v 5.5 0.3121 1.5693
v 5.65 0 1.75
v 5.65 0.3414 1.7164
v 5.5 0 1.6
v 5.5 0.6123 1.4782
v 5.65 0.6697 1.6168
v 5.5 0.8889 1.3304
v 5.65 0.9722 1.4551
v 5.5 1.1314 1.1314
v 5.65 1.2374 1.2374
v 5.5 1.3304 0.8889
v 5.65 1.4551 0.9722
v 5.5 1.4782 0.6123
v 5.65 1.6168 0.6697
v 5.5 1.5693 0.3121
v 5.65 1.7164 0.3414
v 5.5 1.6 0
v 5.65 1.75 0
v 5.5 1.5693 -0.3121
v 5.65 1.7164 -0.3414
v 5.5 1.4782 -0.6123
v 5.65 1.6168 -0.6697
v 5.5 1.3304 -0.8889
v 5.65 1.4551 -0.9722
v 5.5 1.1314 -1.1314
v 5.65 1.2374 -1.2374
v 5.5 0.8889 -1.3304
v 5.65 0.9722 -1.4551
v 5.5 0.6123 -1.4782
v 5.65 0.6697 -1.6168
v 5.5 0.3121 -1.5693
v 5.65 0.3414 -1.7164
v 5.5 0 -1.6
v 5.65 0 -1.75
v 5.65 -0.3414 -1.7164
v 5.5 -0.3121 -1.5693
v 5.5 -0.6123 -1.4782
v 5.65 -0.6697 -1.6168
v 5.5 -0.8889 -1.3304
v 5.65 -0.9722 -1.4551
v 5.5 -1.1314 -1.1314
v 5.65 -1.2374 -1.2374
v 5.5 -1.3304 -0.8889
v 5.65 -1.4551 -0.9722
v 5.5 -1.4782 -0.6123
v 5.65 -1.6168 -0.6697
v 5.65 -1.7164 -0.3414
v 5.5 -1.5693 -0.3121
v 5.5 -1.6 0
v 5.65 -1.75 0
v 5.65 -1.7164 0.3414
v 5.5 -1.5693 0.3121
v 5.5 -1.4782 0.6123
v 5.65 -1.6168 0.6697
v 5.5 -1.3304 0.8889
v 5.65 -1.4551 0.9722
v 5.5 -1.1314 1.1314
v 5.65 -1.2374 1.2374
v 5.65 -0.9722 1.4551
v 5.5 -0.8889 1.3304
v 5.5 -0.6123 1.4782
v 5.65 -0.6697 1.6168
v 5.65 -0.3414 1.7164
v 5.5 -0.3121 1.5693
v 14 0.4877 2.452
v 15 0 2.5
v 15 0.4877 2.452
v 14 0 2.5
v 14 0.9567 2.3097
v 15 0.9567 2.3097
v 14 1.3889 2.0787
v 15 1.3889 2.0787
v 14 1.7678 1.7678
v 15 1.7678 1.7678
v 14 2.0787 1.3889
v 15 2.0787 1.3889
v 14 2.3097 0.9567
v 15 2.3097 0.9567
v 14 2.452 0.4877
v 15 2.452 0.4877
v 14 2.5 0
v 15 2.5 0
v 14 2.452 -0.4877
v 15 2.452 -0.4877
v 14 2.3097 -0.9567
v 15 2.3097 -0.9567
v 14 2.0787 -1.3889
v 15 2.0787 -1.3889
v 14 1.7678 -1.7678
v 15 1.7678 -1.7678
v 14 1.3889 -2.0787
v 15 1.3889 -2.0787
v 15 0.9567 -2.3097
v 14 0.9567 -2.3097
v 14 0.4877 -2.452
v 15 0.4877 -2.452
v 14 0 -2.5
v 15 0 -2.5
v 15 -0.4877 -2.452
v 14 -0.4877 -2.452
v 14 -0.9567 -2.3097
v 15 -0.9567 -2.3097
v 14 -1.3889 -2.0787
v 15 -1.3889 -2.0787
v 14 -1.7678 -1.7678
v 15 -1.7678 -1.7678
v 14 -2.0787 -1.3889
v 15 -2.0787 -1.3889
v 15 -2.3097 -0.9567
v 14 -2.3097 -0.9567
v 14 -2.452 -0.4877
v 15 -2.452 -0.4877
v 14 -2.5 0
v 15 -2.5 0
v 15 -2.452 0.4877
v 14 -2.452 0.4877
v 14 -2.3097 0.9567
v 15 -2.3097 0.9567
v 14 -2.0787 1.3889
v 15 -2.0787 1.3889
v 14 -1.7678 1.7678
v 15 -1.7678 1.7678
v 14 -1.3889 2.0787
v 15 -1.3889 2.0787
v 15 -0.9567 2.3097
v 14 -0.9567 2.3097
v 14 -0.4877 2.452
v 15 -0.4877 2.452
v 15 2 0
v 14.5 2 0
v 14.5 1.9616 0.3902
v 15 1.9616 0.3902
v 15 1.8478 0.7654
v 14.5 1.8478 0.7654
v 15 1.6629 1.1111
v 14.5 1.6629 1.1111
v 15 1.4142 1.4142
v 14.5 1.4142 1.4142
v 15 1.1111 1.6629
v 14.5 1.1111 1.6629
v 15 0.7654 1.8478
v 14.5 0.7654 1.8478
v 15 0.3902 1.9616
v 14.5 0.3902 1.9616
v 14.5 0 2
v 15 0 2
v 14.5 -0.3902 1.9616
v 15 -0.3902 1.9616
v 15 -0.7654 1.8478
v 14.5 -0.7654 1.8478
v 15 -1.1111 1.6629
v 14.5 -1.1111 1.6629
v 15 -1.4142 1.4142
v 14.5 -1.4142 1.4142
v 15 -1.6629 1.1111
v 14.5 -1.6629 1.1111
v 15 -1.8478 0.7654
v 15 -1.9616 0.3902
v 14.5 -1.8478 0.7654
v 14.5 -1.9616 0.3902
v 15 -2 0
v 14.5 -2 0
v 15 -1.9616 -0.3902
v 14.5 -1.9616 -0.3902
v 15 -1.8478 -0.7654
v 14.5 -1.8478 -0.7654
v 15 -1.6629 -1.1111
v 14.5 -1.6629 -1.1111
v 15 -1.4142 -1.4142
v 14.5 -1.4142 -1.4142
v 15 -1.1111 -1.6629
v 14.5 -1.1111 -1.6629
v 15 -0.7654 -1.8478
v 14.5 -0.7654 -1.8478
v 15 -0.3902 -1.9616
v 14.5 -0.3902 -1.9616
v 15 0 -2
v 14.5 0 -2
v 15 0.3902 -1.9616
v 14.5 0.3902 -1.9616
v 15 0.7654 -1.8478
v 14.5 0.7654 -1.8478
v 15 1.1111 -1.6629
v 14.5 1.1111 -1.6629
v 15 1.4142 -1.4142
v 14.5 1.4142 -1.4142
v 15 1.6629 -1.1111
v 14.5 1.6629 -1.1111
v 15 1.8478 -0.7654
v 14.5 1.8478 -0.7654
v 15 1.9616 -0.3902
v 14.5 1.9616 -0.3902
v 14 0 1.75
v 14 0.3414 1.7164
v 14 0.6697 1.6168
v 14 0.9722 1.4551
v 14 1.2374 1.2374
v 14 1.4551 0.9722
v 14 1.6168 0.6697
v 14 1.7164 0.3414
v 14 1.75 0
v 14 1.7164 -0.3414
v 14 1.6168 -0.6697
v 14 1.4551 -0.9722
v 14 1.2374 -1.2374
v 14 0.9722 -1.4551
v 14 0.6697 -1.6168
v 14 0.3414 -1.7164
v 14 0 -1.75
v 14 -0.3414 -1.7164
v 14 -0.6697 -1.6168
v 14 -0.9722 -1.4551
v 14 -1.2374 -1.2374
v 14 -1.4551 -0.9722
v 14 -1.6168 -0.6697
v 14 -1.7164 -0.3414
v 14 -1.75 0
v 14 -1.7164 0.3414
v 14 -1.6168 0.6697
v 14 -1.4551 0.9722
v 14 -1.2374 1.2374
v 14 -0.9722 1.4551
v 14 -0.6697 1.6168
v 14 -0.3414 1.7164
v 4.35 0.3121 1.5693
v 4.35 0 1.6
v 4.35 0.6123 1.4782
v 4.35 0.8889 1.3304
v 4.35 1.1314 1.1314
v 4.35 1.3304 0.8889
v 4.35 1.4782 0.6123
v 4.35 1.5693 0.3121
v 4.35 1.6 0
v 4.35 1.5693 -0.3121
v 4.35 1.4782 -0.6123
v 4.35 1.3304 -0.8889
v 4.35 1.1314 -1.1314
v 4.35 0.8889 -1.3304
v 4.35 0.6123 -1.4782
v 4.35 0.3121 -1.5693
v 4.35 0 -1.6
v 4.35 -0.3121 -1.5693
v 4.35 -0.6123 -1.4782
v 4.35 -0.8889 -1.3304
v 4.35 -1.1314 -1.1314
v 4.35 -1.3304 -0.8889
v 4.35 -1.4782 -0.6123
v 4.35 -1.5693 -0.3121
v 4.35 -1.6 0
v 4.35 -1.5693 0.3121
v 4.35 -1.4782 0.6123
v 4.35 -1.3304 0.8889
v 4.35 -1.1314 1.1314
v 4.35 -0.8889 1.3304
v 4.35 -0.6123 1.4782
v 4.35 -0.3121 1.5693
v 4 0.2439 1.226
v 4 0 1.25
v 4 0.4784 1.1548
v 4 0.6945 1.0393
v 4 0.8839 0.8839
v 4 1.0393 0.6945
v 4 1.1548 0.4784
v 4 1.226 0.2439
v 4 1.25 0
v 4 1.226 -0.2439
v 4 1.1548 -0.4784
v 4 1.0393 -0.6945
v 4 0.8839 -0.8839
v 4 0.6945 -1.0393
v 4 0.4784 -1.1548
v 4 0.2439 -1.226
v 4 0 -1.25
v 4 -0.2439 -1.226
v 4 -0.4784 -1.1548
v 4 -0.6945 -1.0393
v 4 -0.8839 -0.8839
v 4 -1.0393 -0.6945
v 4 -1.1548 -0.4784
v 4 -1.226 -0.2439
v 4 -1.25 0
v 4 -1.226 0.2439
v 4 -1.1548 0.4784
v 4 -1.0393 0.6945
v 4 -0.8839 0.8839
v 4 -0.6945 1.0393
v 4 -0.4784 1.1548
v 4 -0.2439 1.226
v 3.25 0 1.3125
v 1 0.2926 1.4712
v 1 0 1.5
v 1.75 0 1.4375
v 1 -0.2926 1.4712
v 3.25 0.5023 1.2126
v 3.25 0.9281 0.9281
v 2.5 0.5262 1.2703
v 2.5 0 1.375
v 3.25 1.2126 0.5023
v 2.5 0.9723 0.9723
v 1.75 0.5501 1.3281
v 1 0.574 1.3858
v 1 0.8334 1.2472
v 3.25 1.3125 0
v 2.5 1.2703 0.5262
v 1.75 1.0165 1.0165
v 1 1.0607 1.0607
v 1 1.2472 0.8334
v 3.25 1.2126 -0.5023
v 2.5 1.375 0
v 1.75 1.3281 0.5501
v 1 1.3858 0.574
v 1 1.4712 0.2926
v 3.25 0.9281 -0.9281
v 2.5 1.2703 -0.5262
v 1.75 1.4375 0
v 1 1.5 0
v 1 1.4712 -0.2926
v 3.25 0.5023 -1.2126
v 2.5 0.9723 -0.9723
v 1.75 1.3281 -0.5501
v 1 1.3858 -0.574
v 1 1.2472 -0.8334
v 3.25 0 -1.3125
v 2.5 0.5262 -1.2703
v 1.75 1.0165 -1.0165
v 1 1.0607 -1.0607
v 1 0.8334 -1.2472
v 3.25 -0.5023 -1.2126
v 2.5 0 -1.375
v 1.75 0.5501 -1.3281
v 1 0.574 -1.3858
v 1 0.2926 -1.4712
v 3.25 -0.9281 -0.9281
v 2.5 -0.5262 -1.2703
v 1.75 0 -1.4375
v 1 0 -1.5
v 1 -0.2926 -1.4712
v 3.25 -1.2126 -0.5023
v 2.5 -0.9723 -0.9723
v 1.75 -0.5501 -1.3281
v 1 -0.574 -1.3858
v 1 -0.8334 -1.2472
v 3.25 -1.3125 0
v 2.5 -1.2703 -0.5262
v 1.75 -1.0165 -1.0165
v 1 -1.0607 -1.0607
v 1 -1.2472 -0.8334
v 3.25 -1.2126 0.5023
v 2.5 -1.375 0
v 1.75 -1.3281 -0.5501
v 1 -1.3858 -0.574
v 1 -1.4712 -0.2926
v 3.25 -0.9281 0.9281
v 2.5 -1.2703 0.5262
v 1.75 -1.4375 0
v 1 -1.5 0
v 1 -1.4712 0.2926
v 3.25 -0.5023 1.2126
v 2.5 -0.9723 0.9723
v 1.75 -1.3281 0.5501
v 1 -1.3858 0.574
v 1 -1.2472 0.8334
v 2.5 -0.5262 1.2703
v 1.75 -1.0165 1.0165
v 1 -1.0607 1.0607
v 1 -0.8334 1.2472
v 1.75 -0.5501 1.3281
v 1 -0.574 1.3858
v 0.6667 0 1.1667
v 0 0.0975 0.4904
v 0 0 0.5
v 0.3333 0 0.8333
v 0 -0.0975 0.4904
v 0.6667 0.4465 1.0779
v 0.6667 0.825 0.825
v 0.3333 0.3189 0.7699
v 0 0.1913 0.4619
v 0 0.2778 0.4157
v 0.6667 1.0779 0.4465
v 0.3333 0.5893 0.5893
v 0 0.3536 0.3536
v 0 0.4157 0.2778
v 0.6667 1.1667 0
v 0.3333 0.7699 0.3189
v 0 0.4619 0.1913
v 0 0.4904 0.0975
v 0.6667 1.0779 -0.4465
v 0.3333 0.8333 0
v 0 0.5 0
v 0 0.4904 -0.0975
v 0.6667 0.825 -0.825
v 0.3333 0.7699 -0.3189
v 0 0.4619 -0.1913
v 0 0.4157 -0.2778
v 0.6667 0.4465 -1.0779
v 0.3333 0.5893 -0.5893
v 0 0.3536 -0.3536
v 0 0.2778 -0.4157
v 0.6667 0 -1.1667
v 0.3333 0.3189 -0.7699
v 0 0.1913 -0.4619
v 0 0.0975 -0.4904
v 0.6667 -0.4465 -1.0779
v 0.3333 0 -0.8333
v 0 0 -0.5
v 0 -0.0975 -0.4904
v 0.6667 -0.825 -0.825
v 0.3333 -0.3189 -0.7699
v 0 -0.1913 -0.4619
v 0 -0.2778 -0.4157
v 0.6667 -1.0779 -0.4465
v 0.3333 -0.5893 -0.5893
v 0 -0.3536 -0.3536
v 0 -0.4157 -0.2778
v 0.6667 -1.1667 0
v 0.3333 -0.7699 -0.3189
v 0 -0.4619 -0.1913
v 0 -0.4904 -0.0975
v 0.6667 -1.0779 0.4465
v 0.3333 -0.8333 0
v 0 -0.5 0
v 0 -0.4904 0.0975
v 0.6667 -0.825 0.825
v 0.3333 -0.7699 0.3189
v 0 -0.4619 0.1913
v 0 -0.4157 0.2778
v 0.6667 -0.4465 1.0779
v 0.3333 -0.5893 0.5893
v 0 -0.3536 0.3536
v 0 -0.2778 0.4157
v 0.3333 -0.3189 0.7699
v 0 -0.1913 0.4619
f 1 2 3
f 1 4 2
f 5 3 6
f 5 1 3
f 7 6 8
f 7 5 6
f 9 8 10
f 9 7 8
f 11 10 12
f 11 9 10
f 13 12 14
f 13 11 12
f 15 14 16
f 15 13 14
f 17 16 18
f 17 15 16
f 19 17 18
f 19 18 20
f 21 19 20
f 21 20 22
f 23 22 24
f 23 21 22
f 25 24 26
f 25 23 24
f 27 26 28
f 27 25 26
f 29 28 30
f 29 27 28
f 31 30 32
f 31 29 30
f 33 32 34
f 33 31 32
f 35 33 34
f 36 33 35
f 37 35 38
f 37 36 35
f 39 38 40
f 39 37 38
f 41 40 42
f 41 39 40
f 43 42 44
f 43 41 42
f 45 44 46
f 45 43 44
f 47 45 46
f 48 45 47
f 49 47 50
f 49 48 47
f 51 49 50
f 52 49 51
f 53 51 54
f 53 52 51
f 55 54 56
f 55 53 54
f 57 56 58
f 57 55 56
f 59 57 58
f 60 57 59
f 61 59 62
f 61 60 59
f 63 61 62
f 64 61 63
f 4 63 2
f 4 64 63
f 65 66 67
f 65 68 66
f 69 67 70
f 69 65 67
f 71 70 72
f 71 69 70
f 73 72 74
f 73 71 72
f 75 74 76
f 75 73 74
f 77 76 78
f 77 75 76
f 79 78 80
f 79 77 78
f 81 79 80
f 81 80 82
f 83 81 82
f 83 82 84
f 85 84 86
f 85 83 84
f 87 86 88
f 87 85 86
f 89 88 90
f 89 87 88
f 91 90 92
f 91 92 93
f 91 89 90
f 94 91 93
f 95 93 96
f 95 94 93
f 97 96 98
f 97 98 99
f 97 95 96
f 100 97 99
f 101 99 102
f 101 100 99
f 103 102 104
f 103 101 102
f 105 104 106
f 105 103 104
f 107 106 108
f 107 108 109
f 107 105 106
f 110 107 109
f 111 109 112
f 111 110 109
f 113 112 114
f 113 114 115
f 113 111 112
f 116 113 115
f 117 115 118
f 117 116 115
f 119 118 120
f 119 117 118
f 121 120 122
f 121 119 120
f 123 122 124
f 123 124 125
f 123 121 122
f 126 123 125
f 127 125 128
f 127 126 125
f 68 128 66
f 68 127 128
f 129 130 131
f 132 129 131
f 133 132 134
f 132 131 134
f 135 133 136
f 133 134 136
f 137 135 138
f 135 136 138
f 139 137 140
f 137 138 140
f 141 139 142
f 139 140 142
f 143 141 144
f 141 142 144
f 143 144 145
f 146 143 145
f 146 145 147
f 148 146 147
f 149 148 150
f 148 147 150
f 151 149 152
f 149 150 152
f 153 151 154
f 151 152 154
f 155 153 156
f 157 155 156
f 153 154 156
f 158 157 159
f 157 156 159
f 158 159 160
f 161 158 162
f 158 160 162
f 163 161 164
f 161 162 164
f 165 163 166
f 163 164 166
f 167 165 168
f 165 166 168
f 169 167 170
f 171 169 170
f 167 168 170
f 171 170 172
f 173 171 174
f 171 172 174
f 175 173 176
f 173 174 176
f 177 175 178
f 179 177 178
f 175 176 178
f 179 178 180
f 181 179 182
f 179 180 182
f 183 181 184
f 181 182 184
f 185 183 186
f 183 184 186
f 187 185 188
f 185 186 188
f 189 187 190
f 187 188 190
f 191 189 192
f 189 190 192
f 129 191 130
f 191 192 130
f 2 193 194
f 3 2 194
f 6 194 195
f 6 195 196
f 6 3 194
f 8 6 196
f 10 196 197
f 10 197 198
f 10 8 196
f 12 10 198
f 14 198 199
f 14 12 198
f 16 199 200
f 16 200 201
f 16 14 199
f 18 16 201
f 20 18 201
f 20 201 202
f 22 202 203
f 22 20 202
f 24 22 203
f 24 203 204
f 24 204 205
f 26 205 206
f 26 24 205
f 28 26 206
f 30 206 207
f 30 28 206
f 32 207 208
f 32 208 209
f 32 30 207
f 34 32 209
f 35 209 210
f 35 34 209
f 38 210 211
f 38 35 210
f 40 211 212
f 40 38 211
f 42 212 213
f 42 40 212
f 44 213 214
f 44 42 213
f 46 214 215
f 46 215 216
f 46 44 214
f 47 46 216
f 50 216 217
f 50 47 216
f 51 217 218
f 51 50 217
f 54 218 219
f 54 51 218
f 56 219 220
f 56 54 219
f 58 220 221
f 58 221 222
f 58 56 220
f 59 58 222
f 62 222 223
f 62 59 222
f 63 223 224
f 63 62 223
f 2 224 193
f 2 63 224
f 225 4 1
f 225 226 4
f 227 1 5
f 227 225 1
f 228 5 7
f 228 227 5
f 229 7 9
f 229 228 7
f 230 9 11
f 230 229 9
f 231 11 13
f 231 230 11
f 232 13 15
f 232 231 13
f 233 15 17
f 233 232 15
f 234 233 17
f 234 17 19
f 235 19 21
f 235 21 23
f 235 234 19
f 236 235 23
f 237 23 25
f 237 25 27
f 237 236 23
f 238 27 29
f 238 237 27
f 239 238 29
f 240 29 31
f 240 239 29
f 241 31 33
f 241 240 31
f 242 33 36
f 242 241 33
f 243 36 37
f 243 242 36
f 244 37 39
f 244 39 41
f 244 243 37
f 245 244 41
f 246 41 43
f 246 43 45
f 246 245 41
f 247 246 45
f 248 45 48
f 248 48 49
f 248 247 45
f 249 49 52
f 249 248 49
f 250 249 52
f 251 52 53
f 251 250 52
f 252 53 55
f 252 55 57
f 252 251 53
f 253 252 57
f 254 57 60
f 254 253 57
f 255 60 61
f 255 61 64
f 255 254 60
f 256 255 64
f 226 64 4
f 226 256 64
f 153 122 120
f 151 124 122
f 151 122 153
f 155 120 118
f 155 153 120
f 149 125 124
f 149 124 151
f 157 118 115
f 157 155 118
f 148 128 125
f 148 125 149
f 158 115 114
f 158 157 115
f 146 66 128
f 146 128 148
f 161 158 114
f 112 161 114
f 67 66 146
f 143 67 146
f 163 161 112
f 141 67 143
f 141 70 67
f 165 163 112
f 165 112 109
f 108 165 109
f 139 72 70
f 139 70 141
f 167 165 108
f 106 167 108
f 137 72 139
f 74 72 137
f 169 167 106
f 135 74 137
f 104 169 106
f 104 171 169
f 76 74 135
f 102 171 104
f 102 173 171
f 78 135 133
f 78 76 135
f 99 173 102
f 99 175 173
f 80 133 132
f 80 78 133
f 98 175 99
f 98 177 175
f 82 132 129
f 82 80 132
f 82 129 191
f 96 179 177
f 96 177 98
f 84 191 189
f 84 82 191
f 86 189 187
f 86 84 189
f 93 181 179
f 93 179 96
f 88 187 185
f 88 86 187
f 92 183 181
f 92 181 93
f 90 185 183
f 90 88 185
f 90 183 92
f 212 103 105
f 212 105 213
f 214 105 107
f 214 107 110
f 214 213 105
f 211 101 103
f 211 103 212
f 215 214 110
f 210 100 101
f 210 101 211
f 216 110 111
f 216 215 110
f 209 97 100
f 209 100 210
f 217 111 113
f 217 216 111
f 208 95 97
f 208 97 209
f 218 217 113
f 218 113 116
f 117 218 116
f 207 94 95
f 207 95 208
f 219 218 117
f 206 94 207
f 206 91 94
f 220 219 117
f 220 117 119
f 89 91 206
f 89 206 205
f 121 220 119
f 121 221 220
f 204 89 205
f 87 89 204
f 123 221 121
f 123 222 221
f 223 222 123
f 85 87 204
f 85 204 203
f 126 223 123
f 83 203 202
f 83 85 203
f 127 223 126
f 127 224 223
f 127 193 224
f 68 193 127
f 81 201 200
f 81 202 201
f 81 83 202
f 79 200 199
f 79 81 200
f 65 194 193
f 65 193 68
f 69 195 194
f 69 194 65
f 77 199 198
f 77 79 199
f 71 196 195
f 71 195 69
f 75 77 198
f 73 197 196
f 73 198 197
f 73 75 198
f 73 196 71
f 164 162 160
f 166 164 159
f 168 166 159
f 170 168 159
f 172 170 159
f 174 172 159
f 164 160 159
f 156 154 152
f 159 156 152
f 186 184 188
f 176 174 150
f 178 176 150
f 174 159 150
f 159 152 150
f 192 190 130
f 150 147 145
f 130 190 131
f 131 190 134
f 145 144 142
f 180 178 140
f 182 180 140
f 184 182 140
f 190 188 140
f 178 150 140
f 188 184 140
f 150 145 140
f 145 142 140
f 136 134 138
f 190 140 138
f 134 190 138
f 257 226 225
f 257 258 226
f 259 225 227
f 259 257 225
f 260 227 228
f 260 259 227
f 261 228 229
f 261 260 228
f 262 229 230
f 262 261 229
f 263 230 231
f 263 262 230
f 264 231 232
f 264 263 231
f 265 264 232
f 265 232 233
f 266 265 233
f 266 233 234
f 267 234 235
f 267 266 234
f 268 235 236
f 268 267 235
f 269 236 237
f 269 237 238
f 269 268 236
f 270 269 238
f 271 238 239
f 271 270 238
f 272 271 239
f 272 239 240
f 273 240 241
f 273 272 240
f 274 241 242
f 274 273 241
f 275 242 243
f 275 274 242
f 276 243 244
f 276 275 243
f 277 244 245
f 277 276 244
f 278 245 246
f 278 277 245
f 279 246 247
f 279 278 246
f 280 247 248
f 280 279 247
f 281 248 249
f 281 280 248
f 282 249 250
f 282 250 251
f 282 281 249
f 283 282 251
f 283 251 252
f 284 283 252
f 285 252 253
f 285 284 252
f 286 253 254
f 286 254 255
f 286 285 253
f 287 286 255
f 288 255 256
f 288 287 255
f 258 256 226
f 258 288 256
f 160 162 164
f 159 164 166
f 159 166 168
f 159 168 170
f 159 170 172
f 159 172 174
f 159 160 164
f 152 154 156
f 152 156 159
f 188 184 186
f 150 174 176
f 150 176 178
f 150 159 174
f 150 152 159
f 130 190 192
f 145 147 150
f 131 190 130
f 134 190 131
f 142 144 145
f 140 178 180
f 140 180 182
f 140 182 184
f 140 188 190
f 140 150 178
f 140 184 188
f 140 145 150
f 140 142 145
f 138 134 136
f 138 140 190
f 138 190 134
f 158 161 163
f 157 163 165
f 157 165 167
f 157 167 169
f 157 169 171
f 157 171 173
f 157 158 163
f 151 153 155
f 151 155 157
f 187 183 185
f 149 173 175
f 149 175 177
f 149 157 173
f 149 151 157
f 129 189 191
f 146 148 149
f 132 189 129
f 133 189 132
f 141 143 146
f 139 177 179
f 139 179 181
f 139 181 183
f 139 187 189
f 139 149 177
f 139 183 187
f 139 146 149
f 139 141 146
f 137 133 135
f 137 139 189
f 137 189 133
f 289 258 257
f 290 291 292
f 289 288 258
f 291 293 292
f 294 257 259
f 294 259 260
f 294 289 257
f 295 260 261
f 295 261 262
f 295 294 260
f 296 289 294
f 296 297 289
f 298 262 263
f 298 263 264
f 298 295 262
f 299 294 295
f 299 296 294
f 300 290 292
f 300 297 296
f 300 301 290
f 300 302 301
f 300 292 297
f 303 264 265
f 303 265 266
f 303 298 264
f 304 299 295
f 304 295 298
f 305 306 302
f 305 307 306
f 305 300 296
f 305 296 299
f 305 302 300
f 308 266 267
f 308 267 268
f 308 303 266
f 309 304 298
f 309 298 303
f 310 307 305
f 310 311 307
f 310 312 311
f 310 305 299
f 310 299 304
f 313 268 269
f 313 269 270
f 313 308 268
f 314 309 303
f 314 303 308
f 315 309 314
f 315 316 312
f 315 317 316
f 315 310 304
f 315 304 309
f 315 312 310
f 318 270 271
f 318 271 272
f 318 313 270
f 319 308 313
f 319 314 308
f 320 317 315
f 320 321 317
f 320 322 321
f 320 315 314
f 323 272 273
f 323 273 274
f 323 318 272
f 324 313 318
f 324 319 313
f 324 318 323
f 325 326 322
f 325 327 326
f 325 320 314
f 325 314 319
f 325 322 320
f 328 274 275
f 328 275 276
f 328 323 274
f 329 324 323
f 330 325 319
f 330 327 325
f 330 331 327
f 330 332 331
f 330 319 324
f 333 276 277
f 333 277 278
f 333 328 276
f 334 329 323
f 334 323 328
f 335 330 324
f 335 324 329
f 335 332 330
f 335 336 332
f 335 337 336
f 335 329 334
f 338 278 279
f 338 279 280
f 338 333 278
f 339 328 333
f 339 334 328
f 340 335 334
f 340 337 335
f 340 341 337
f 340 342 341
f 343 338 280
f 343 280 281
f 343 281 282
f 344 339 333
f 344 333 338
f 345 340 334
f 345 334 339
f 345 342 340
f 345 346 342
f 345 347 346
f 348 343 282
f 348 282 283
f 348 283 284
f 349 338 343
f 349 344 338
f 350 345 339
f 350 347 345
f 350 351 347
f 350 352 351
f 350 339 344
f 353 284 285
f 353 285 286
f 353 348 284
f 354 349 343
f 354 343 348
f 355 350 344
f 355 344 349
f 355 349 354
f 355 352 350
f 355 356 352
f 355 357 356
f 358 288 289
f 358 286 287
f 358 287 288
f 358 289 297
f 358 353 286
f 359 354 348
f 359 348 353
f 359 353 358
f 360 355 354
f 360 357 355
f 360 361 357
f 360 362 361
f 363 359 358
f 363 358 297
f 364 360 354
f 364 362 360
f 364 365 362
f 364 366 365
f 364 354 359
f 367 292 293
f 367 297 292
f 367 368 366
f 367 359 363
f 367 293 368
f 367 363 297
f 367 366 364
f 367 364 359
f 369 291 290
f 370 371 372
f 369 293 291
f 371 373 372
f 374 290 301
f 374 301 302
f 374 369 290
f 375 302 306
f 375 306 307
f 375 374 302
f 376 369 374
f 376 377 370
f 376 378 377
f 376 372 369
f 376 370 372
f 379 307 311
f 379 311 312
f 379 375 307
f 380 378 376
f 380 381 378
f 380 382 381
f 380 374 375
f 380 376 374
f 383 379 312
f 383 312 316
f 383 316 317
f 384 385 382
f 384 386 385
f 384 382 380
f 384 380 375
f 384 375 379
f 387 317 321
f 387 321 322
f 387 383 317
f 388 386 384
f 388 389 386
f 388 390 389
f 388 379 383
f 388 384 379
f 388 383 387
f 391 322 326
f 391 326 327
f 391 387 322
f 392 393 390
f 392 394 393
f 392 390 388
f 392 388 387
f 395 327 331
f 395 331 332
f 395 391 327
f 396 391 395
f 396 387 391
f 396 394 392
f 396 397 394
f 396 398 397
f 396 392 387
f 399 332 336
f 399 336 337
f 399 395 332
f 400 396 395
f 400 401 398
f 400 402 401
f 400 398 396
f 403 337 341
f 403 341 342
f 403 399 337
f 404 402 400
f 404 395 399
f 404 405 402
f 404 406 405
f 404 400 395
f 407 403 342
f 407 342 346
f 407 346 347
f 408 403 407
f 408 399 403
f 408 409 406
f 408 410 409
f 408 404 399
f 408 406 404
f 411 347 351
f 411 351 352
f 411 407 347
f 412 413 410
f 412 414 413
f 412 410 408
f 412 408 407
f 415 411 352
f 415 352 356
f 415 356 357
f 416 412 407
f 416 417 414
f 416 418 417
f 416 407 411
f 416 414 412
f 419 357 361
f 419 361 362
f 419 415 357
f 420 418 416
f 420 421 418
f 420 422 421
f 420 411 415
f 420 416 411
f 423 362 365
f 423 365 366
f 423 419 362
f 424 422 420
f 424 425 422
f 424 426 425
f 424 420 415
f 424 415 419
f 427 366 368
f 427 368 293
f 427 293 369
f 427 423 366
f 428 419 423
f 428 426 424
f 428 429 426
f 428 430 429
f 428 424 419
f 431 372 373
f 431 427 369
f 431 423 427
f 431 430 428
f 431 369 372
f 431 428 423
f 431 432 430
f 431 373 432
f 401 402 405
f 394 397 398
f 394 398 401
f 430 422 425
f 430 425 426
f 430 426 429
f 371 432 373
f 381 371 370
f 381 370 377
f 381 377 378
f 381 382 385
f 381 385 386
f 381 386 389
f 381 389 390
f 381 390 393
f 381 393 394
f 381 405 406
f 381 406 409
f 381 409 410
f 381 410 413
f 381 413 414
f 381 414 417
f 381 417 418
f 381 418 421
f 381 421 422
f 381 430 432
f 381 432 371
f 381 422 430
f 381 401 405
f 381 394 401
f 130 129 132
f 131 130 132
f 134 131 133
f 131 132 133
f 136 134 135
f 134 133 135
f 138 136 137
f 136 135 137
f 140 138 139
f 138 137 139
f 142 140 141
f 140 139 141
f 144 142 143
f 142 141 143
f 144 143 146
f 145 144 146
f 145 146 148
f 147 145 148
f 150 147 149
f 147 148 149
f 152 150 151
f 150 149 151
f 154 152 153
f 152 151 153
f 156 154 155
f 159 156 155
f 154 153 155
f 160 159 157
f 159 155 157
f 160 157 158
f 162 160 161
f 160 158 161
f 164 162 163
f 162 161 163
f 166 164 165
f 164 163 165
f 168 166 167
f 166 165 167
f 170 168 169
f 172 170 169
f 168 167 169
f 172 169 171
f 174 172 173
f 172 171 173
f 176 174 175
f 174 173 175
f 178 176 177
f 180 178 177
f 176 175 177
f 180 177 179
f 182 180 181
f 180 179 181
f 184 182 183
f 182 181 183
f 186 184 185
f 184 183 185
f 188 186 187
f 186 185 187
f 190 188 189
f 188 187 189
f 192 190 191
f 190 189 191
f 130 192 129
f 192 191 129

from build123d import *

# Parameters (mm, degrees)
F2_R     = 2
F3_DEPTH = 0.5
F4_R     = 2
F5_DEPTH = 0.5


with BuildPart() as f1:
    # F0 (on Front) → F1 (revolve)
    with BuildSketch(Plane.XZ):
        Polygon((0, 0.5), (0, 0), (15, 0), (15, 2.5), (14, 2.5), (14, 1.75), (5.65, 1.75), (5.5, 1.6), (4.35, 1.6), (4, 1.25), (1, 1.5), align=None)
    revolve(axis=Axis((7.5, 0, 0), (-1, 0, 0)))

    # F2 (on face) → F3 (cut)
    with BuildSketch(Plane.YZ.offset(15)):
        Circle(F2_R)
    extrude(amount=-F3_DEPTH, mode=Mode.SUBTRACT)


with BuildPart() as f5:
    # F4 (on face) → F5 (new body)
    with BuildSketch(Plane.YZ.offset(14.5)):
        Circle(F4_R)
    extrude(amount=F5_DEPTH)


solid = Compound([f1.part, f5.part])
